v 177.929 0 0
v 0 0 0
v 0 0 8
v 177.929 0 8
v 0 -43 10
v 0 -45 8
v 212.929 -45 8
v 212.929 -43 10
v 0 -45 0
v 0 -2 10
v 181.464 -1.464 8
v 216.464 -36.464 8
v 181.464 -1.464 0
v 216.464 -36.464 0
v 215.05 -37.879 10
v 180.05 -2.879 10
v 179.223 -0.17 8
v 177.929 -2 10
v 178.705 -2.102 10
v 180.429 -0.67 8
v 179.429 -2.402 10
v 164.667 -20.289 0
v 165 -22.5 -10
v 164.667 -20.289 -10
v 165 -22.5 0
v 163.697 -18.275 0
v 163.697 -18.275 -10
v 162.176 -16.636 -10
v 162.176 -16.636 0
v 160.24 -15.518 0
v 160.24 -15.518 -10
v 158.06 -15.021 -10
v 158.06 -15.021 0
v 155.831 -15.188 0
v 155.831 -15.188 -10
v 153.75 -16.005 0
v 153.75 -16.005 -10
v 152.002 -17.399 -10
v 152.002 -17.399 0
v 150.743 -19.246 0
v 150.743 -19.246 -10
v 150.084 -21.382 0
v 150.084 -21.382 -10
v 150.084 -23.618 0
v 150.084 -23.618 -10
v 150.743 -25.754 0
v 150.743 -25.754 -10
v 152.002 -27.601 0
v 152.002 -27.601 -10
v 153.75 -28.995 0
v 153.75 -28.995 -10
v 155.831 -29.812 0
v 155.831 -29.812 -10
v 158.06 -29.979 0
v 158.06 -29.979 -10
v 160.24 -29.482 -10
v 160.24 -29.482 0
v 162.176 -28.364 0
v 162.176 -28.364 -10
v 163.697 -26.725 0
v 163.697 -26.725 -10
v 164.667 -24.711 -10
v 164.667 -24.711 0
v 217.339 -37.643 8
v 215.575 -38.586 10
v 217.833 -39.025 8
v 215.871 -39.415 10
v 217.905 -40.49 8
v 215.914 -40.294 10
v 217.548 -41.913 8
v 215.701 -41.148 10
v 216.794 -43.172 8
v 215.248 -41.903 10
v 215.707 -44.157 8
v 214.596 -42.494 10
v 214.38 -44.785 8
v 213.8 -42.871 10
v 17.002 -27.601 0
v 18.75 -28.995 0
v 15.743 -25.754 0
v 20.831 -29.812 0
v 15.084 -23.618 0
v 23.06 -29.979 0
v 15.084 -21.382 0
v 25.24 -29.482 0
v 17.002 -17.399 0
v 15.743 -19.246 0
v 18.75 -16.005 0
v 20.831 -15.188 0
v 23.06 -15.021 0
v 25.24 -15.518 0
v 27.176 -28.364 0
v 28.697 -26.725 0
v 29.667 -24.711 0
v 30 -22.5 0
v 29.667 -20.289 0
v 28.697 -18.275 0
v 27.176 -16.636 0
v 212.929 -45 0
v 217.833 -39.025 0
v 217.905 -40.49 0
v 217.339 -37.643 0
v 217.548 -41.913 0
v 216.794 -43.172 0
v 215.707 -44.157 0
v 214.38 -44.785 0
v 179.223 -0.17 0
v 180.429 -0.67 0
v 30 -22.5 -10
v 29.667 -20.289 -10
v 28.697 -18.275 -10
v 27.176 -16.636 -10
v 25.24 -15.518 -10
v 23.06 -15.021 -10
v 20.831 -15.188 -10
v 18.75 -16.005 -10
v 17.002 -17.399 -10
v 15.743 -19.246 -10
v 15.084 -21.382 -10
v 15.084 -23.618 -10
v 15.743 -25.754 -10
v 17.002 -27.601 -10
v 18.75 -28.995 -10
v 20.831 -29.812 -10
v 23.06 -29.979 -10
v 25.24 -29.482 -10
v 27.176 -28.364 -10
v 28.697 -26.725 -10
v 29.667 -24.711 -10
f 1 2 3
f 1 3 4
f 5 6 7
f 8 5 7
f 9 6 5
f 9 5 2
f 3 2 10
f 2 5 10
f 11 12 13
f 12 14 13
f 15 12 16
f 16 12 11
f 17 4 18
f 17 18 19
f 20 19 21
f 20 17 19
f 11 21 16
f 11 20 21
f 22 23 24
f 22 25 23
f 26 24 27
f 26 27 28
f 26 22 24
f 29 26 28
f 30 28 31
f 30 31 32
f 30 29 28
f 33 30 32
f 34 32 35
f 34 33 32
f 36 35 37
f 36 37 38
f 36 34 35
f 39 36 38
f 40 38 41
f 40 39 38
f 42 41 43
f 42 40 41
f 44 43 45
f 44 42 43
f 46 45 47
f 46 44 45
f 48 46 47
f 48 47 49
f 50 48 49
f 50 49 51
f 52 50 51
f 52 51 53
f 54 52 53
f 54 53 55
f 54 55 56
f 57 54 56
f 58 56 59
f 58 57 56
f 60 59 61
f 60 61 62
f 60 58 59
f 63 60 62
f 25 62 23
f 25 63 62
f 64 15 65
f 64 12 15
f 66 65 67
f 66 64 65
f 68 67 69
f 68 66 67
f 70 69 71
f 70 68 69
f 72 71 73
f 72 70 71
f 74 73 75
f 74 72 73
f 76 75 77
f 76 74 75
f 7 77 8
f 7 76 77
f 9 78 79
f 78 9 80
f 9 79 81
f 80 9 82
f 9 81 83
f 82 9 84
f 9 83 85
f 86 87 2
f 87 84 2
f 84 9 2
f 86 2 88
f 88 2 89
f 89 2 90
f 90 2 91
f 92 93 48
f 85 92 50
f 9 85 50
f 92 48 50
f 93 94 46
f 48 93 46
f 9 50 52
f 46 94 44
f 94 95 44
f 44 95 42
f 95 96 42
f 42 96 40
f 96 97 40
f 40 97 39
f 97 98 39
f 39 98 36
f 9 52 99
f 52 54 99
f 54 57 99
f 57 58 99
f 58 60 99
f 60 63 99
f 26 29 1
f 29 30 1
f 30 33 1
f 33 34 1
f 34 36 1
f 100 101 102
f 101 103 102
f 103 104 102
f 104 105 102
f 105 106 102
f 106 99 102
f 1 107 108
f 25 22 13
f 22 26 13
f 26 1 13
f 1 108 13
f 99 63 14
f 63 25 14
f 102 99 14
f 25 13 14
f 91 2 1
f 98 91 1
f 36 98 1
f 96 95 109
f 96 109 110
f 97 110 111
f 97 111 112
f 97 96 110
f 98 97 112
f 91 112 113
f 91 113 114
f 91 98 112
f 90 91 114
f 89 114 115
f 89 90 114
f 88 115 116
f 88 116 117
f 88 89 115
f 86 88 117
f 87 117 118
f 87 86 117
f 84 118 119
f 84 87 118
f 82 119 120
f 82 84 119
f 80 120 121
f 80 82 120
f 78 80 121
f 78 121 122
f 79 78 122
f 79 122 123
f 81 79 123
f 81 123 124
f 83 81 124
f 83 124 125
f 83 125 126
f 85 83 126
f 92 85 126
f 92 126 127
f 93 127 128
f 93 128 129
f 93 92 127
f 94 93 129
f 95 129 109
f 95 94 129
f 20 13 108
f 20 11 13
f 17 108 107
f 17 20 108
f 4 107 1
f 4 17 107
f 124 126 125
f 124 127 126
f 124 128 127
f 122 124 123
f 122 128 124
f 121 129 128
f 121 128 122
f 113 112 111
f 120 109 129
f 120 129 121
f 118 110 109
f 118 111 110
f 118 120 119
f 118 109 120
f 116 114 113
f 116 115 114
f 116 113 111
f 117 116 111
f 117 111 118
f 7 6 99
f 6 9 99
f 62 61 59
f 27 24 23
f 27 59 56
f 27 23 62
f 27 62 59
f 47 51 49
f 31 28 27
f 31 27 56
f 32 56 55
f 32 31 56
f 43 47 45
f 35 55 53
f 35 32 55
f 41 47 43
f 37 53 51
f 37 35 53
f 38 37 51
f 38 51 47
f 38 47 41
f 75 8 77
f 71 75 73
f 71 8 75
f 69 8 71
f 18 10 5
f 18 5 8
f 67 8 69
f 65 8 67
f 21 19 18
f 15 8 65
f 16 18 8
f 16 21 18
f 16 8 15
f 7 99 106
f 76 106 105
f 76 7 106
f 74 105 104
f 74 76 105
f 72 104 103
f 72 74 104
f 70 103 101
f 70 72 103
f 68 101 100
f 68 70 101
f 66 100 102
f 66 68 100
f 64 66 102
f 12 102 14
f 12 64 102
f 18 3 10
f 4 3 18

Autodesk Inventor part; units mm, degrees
ref_plane "YZ Plane" through (0, 0, 0) normal (1, 0, 0) x (0, 1, 0)
ref_plane "XZ Plane" through (0, 0, 0) normal (0, 1, 0) x (-1, 0, 0)
ref_plane "XY Plane" through (0, 0, 0) normal (0, 0, 1) x (1, 0, 0)
sketch "Sketch1" plane through (0, 0, 0) normal (0, 0, 1) x (1, 0, 0)
  line L0 (-180, 0) -> (0, 0)
  line L1 (-225, -45) -> (0, -45)
  line L2 (-180, 0) -> (-225, -45)
  line L3 (0, 0) -> (0, -45)
  dimension "d2" = 45
  dimension "d9" = 225
  dimension "d10" = 180
extrude "Extrusion1" add sketch "Sketch1" along normal blind 10
sketch "Sketch4" plane through (0, 0, 0) normal (0, 0, -1) x (-1, 0, 0)
  circle A0 centre (22.5, -22.5) radius 7.5
  circle A1 centre (157.5, -22.5) radius 7.5
  point P0 (0, -45)
  point P1 (180, 0)
  dimension "d26" = 15
  dimension "d30" = 15
extrude "Extrusion2" add sketch "Sketch4" along normal blind 10
fillet "Fillet5" radius 5 2 edges at (-225, -45, 5) (-180, 0, 5)
chamfer "Chamfer3" distance 2 angle 45 5 edges at (-106.4645, -45, 10) (-217.5483, -41.9134, 10) (-198.9645, -18.9645, 10) (-179.8423, -0.3806, 10) (-88.9645, 0, 10)
mirror "Mirror1" about plane through (0, 0, 0) normal (1, 0, 0)
sketch "Sketch6" plane through (0, 0, 10) normal (0, 0, 1) x (1, 0, 0)
  line L0 (0, 20) -> (-220, 20)
  line L1 (-220, 20) -> (-220, -60)
  line L2 (-220, -60) -> (0, -60)
  line L3 (0, -60) -> (0, 20)
  point P0 (0, 0)
  dimension "d47" = 220
  dimension "d48" = 80
extrude "Extrusion6" cut sketch "Sketch6" against normal blind 20
properties part number "Border"
